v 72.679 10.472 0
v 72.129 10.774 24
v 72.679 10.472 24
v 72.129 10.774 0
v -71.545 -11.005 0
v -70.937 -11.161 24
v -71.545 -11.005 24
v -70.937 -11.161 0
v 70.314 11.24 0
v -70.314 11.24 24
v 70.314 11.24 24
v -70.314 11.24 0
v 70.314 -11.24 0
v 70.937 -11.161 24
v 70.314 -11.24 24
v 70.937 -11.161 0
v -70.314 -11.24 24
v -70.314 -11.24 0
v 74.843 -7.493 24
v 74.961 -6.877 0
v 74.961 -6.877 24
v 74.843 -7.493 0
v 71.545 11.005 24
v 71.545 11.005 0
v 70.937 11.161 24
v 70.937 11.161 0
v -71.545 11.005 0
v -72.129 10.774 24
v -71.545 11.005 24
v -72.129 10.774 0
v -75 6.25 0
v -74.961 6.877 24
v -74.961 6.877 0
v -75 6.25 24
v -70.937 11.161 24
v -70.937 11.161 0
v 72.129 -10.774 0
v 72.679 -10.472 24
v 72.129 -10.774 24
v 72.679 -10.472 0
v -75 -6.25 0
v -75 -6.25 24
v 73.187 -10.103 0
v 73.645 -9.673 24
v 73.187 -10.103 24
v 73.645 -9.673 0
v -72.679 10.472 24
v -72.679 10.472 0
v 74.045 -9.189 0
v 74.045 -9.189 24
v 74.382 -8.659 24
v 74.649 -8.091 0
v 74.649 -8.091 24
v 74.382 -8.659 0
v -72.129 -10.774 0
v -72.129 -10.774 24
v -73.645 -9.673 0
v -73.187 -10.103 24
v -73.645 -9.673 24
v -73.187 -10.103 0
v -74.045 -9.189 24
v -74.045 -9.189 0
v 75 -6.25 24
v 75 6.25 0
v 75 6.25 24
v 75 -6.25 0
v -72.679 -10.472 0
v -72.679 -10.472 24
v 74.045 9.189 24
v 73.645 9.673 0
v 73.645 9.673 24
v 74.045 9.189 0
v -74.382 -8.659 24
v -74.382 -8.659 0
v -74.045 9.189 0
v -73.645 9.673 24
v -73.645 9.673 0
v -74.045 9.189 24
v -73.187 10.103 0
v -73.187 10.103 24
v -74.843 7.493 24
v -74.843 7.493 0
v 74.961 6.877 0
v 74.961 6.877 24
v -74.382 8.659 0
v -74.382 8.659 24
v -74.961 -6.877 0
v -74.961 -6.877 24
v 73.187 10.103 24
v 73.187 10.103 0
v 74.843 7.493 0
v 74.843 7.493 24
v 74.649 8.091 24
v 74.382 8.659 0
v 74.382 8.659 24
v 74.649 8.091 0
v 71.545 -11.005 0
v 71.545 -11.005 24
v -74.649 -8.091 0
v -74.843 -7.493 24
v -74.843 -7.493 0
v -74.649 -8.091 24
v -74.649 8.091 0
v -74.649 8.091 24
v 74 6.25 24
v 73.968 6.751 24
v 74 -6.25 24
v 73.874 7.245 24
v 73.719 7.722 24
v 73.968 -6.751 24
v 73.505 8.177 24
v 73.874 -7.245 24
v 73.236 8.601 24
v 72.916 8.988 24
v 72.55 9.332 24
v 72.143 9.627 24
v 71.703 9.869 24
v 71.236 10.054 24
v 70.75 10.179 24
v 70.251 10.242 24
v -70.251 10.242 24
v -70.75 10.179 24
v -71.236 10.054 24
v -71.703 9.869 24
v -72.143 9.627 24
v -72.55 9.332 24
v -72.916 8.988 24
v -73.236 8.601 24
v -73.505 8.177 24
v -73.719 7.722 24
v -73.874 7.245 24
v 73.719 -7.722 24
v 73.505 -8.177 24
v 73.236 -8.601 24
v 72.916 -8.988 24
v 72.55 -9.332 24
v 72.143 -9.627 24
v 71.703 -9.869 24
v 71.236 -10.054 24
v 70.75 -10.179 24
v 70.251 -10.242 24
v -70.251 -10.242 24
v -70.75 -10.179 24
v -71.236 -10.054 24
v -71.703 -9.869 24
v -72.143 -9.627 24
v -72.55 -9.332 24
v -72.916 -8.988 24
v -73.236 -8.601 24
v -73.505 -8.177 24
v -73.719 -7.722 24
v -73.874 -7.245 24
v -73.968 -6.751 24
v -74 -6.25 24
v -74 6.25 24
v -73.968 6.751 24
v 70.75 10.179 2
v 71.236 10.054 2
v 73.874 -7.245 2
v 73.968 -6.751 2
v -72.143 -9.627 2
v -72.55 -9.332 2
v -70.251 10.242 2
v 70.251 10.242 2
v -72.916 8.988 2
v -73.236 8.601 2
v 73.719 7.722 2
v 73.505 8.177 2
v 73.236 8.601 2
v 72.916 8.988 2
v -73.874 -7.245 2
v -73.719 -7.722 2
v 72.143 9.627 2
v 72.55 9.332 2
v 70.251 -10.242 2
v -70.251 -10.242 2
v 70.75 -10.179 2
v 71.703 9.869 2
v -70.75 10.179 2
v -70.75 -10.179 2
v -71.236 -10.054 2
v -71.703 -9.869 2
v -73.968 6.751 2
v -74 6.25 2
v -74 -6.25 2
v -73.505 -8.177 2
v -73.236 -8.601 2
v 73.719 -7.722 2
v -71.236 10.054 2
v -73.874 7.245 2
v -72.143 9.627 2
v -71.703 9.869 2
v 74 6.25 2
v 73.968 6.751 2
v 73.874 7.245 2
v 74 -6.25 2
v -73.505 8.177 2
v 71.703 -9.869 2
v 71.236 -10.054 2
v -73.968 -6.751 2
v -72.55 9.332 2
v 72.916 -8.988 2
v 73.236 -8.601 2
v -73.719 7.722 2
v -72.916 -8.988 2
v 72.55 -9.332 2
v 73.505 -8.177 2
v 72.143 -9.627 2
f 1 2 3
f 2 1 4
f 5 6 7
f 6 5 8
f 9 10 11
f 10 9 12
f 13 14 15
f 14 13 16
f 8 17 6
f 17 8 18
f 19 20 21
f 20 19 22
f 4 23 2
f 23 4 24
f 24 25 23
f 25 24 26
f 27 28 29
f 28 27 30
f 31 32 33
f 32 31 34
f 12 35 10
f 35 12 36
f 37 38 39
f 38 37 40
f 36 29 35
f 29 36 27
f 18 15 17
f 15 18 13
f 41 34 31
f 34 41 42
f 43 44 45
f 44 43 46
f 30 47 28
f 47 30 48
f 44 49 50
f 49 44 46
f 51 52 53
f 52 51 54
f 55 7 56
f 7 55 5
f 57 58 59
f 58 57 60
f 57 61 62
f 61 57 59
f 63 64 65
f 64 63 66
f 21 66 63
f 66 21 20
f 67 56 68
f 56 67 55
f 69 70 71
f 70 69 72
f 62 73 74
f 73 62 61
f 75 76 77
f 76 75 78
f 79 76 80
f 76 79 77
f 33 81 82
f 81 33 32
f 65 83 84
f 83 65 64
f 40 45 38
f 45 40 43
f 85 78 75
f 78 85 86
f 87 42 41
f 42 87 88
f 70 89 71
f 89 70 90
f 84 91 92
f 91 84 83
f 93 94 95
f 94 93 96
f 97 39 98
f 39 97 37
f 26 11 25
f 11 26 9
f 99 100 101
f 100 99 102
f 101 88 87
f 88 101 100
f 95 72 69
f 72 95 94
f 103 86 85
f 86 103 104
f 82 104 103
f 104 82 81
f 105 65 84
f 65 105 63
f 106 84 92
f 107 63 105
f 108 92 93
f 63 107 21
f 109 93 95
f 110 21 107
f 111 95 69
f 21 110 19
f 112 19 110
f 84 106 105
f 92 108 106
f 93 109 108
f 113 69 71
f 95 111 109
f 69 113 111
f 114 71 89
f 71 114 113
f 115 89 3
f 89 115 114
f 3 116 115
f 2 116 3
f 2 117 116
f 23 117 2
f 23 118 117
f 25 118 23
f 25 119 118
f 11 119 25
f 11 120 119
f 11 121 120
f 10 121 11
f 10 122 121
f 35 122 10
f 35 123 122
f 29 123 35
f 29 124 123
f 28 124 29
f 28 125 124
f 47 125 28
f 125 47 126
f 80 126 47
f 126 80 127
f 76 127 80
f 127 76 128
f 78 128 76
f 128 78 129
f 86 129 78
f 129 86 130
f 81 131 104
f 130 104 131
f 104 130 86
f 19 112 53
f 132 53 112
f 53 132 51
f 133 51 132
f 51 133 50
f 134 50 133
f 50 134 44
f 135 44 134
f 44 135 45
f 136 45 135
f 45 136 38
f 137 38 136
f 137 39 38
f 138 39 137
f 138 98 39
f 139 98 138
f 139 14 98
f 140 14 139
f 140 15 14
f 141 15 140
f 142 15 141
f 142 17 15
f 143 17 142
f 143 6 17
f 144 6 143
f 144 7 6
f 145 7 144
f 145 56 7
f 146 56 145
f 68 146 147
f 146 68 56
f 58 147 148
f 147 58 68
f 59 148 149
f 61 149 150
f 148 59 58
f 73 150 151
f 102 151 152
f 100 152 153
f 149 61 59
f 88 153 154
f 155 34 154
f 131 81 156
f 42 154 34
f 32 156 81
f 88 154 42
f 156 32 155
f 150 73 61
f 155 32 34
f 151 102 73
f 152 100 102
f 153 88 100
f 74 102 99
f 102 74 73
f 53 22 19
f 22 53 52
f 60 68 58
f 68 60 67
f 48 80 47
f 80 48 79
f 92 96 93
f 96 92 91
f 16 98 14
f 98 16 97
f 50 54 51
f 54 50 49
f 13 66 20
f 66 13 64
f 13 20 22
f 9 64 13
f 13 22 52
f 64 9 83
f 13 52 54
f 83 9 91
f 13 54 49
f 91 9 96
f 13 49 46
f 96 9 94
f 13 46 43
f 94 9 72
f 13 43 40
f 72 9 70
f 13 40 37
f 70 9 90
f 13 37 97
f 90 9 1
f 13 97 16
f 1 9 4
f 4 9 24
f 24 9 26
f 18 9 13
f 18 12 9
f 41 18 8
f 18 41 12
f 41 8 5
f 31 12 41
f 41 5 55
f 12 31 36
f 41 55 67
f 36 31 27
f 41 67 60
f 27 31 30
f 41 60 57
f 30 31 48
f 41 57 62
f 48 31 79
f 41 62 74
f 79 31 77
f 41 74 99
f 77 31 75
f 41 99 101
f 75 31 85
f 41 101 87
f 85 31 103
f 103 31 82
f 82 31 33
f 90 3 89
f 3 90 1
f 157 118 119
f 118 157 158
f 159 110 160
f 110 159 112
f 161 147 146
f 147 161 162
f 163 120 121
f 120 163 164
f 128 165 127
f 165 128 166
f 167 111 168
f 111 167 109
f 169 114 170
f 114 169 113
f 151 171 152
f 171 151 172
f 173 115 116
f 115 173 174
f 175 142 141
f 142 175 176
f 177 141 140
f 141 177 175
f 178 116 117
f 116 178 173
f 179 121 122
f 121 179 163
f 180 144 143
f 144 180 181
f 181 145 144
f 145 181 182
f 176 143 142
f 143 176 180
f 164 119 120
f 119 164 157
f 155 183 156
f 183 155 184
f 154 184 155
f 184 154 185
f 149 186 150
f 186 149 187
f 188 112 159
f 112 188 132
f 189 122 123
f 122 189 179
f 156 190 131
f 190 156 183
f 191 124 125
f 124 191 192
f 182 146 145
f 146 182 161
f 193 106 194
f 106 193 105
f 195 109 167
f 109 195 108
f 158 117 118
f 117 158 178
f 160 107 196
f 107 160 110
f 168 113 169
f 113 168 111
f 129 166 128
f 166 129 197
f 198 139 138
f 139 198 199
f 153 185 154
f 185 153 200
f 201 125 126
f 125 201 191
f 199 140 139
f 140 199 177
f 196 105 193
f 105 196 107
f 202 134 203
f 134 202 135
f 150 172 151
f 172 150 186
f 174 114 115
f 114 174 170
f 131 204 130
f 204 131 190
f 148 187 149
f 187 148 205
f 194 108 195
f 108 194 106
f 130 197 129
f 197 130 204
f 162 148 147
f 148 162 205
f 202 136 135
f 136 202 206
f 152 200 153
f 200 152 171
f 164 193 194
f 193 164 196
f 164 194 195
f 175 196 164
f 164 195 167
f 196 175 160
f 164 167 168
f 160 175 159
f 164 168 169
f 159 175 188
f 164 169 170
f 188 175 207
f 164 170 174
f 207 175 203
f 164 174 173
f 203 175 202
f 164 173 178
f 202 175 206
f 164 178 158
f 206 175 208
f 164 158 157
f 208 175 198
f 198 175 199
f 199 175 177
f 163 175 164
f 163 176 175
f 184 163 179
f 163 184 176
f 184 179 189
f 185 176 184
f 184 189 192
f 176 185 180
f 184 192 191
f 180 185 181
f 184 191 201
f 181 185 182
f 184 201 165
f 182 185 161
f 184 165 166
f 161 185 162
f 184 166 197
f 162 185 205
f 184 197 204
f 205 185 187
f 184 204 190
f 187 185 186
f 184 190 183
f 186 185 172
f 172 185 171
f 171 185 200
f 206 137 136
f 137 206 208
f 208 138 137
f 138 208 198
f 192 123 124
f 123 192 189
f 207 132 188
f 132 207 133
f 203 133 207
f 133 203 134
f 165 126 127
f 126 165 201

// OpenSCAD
$fn = 50;


difference() {
	union() {
		hull() {
			translate(v = [-70.0000000000, 6.2500000000, 0]) {
				cylinder(h = 24, r = 5);
			}
			translate(v = [70.0000000000, 6.2500000000, 0]) {
				cylinder(h = 24, r = 5);
			}
			translate(v = [-70.0000000000, -6.2500000000, 0]) {
				cylinder(h = 24, r = 5);
			}
			translate(v = [70.0000000000, -6.2500000000, 0]) {
				cylinder(h = 24, r = 5);
			}
		}
	}
	union() {
		translate(v = [0, 0, 2]) {
			hull() {
				translate(v = [-70.0000000000, 6.2500000000, 0]) {
					cylinder(h = 22, r = 4);
				}
				translate(v = [70.0000000000, 6.2500000000, 0]) {
					cylinder(h = 22, r = 4);
				}
				translate(v = [-70.0000000000, -6.2500000000, 0]) {
					cylinder(h = 22, r = 4);
				}
				translate(v = [70.0000000000, -6.2500000000, 0]) {
					cylinder(h = 22, r = 4);
				}
			}
		}
	}
}
